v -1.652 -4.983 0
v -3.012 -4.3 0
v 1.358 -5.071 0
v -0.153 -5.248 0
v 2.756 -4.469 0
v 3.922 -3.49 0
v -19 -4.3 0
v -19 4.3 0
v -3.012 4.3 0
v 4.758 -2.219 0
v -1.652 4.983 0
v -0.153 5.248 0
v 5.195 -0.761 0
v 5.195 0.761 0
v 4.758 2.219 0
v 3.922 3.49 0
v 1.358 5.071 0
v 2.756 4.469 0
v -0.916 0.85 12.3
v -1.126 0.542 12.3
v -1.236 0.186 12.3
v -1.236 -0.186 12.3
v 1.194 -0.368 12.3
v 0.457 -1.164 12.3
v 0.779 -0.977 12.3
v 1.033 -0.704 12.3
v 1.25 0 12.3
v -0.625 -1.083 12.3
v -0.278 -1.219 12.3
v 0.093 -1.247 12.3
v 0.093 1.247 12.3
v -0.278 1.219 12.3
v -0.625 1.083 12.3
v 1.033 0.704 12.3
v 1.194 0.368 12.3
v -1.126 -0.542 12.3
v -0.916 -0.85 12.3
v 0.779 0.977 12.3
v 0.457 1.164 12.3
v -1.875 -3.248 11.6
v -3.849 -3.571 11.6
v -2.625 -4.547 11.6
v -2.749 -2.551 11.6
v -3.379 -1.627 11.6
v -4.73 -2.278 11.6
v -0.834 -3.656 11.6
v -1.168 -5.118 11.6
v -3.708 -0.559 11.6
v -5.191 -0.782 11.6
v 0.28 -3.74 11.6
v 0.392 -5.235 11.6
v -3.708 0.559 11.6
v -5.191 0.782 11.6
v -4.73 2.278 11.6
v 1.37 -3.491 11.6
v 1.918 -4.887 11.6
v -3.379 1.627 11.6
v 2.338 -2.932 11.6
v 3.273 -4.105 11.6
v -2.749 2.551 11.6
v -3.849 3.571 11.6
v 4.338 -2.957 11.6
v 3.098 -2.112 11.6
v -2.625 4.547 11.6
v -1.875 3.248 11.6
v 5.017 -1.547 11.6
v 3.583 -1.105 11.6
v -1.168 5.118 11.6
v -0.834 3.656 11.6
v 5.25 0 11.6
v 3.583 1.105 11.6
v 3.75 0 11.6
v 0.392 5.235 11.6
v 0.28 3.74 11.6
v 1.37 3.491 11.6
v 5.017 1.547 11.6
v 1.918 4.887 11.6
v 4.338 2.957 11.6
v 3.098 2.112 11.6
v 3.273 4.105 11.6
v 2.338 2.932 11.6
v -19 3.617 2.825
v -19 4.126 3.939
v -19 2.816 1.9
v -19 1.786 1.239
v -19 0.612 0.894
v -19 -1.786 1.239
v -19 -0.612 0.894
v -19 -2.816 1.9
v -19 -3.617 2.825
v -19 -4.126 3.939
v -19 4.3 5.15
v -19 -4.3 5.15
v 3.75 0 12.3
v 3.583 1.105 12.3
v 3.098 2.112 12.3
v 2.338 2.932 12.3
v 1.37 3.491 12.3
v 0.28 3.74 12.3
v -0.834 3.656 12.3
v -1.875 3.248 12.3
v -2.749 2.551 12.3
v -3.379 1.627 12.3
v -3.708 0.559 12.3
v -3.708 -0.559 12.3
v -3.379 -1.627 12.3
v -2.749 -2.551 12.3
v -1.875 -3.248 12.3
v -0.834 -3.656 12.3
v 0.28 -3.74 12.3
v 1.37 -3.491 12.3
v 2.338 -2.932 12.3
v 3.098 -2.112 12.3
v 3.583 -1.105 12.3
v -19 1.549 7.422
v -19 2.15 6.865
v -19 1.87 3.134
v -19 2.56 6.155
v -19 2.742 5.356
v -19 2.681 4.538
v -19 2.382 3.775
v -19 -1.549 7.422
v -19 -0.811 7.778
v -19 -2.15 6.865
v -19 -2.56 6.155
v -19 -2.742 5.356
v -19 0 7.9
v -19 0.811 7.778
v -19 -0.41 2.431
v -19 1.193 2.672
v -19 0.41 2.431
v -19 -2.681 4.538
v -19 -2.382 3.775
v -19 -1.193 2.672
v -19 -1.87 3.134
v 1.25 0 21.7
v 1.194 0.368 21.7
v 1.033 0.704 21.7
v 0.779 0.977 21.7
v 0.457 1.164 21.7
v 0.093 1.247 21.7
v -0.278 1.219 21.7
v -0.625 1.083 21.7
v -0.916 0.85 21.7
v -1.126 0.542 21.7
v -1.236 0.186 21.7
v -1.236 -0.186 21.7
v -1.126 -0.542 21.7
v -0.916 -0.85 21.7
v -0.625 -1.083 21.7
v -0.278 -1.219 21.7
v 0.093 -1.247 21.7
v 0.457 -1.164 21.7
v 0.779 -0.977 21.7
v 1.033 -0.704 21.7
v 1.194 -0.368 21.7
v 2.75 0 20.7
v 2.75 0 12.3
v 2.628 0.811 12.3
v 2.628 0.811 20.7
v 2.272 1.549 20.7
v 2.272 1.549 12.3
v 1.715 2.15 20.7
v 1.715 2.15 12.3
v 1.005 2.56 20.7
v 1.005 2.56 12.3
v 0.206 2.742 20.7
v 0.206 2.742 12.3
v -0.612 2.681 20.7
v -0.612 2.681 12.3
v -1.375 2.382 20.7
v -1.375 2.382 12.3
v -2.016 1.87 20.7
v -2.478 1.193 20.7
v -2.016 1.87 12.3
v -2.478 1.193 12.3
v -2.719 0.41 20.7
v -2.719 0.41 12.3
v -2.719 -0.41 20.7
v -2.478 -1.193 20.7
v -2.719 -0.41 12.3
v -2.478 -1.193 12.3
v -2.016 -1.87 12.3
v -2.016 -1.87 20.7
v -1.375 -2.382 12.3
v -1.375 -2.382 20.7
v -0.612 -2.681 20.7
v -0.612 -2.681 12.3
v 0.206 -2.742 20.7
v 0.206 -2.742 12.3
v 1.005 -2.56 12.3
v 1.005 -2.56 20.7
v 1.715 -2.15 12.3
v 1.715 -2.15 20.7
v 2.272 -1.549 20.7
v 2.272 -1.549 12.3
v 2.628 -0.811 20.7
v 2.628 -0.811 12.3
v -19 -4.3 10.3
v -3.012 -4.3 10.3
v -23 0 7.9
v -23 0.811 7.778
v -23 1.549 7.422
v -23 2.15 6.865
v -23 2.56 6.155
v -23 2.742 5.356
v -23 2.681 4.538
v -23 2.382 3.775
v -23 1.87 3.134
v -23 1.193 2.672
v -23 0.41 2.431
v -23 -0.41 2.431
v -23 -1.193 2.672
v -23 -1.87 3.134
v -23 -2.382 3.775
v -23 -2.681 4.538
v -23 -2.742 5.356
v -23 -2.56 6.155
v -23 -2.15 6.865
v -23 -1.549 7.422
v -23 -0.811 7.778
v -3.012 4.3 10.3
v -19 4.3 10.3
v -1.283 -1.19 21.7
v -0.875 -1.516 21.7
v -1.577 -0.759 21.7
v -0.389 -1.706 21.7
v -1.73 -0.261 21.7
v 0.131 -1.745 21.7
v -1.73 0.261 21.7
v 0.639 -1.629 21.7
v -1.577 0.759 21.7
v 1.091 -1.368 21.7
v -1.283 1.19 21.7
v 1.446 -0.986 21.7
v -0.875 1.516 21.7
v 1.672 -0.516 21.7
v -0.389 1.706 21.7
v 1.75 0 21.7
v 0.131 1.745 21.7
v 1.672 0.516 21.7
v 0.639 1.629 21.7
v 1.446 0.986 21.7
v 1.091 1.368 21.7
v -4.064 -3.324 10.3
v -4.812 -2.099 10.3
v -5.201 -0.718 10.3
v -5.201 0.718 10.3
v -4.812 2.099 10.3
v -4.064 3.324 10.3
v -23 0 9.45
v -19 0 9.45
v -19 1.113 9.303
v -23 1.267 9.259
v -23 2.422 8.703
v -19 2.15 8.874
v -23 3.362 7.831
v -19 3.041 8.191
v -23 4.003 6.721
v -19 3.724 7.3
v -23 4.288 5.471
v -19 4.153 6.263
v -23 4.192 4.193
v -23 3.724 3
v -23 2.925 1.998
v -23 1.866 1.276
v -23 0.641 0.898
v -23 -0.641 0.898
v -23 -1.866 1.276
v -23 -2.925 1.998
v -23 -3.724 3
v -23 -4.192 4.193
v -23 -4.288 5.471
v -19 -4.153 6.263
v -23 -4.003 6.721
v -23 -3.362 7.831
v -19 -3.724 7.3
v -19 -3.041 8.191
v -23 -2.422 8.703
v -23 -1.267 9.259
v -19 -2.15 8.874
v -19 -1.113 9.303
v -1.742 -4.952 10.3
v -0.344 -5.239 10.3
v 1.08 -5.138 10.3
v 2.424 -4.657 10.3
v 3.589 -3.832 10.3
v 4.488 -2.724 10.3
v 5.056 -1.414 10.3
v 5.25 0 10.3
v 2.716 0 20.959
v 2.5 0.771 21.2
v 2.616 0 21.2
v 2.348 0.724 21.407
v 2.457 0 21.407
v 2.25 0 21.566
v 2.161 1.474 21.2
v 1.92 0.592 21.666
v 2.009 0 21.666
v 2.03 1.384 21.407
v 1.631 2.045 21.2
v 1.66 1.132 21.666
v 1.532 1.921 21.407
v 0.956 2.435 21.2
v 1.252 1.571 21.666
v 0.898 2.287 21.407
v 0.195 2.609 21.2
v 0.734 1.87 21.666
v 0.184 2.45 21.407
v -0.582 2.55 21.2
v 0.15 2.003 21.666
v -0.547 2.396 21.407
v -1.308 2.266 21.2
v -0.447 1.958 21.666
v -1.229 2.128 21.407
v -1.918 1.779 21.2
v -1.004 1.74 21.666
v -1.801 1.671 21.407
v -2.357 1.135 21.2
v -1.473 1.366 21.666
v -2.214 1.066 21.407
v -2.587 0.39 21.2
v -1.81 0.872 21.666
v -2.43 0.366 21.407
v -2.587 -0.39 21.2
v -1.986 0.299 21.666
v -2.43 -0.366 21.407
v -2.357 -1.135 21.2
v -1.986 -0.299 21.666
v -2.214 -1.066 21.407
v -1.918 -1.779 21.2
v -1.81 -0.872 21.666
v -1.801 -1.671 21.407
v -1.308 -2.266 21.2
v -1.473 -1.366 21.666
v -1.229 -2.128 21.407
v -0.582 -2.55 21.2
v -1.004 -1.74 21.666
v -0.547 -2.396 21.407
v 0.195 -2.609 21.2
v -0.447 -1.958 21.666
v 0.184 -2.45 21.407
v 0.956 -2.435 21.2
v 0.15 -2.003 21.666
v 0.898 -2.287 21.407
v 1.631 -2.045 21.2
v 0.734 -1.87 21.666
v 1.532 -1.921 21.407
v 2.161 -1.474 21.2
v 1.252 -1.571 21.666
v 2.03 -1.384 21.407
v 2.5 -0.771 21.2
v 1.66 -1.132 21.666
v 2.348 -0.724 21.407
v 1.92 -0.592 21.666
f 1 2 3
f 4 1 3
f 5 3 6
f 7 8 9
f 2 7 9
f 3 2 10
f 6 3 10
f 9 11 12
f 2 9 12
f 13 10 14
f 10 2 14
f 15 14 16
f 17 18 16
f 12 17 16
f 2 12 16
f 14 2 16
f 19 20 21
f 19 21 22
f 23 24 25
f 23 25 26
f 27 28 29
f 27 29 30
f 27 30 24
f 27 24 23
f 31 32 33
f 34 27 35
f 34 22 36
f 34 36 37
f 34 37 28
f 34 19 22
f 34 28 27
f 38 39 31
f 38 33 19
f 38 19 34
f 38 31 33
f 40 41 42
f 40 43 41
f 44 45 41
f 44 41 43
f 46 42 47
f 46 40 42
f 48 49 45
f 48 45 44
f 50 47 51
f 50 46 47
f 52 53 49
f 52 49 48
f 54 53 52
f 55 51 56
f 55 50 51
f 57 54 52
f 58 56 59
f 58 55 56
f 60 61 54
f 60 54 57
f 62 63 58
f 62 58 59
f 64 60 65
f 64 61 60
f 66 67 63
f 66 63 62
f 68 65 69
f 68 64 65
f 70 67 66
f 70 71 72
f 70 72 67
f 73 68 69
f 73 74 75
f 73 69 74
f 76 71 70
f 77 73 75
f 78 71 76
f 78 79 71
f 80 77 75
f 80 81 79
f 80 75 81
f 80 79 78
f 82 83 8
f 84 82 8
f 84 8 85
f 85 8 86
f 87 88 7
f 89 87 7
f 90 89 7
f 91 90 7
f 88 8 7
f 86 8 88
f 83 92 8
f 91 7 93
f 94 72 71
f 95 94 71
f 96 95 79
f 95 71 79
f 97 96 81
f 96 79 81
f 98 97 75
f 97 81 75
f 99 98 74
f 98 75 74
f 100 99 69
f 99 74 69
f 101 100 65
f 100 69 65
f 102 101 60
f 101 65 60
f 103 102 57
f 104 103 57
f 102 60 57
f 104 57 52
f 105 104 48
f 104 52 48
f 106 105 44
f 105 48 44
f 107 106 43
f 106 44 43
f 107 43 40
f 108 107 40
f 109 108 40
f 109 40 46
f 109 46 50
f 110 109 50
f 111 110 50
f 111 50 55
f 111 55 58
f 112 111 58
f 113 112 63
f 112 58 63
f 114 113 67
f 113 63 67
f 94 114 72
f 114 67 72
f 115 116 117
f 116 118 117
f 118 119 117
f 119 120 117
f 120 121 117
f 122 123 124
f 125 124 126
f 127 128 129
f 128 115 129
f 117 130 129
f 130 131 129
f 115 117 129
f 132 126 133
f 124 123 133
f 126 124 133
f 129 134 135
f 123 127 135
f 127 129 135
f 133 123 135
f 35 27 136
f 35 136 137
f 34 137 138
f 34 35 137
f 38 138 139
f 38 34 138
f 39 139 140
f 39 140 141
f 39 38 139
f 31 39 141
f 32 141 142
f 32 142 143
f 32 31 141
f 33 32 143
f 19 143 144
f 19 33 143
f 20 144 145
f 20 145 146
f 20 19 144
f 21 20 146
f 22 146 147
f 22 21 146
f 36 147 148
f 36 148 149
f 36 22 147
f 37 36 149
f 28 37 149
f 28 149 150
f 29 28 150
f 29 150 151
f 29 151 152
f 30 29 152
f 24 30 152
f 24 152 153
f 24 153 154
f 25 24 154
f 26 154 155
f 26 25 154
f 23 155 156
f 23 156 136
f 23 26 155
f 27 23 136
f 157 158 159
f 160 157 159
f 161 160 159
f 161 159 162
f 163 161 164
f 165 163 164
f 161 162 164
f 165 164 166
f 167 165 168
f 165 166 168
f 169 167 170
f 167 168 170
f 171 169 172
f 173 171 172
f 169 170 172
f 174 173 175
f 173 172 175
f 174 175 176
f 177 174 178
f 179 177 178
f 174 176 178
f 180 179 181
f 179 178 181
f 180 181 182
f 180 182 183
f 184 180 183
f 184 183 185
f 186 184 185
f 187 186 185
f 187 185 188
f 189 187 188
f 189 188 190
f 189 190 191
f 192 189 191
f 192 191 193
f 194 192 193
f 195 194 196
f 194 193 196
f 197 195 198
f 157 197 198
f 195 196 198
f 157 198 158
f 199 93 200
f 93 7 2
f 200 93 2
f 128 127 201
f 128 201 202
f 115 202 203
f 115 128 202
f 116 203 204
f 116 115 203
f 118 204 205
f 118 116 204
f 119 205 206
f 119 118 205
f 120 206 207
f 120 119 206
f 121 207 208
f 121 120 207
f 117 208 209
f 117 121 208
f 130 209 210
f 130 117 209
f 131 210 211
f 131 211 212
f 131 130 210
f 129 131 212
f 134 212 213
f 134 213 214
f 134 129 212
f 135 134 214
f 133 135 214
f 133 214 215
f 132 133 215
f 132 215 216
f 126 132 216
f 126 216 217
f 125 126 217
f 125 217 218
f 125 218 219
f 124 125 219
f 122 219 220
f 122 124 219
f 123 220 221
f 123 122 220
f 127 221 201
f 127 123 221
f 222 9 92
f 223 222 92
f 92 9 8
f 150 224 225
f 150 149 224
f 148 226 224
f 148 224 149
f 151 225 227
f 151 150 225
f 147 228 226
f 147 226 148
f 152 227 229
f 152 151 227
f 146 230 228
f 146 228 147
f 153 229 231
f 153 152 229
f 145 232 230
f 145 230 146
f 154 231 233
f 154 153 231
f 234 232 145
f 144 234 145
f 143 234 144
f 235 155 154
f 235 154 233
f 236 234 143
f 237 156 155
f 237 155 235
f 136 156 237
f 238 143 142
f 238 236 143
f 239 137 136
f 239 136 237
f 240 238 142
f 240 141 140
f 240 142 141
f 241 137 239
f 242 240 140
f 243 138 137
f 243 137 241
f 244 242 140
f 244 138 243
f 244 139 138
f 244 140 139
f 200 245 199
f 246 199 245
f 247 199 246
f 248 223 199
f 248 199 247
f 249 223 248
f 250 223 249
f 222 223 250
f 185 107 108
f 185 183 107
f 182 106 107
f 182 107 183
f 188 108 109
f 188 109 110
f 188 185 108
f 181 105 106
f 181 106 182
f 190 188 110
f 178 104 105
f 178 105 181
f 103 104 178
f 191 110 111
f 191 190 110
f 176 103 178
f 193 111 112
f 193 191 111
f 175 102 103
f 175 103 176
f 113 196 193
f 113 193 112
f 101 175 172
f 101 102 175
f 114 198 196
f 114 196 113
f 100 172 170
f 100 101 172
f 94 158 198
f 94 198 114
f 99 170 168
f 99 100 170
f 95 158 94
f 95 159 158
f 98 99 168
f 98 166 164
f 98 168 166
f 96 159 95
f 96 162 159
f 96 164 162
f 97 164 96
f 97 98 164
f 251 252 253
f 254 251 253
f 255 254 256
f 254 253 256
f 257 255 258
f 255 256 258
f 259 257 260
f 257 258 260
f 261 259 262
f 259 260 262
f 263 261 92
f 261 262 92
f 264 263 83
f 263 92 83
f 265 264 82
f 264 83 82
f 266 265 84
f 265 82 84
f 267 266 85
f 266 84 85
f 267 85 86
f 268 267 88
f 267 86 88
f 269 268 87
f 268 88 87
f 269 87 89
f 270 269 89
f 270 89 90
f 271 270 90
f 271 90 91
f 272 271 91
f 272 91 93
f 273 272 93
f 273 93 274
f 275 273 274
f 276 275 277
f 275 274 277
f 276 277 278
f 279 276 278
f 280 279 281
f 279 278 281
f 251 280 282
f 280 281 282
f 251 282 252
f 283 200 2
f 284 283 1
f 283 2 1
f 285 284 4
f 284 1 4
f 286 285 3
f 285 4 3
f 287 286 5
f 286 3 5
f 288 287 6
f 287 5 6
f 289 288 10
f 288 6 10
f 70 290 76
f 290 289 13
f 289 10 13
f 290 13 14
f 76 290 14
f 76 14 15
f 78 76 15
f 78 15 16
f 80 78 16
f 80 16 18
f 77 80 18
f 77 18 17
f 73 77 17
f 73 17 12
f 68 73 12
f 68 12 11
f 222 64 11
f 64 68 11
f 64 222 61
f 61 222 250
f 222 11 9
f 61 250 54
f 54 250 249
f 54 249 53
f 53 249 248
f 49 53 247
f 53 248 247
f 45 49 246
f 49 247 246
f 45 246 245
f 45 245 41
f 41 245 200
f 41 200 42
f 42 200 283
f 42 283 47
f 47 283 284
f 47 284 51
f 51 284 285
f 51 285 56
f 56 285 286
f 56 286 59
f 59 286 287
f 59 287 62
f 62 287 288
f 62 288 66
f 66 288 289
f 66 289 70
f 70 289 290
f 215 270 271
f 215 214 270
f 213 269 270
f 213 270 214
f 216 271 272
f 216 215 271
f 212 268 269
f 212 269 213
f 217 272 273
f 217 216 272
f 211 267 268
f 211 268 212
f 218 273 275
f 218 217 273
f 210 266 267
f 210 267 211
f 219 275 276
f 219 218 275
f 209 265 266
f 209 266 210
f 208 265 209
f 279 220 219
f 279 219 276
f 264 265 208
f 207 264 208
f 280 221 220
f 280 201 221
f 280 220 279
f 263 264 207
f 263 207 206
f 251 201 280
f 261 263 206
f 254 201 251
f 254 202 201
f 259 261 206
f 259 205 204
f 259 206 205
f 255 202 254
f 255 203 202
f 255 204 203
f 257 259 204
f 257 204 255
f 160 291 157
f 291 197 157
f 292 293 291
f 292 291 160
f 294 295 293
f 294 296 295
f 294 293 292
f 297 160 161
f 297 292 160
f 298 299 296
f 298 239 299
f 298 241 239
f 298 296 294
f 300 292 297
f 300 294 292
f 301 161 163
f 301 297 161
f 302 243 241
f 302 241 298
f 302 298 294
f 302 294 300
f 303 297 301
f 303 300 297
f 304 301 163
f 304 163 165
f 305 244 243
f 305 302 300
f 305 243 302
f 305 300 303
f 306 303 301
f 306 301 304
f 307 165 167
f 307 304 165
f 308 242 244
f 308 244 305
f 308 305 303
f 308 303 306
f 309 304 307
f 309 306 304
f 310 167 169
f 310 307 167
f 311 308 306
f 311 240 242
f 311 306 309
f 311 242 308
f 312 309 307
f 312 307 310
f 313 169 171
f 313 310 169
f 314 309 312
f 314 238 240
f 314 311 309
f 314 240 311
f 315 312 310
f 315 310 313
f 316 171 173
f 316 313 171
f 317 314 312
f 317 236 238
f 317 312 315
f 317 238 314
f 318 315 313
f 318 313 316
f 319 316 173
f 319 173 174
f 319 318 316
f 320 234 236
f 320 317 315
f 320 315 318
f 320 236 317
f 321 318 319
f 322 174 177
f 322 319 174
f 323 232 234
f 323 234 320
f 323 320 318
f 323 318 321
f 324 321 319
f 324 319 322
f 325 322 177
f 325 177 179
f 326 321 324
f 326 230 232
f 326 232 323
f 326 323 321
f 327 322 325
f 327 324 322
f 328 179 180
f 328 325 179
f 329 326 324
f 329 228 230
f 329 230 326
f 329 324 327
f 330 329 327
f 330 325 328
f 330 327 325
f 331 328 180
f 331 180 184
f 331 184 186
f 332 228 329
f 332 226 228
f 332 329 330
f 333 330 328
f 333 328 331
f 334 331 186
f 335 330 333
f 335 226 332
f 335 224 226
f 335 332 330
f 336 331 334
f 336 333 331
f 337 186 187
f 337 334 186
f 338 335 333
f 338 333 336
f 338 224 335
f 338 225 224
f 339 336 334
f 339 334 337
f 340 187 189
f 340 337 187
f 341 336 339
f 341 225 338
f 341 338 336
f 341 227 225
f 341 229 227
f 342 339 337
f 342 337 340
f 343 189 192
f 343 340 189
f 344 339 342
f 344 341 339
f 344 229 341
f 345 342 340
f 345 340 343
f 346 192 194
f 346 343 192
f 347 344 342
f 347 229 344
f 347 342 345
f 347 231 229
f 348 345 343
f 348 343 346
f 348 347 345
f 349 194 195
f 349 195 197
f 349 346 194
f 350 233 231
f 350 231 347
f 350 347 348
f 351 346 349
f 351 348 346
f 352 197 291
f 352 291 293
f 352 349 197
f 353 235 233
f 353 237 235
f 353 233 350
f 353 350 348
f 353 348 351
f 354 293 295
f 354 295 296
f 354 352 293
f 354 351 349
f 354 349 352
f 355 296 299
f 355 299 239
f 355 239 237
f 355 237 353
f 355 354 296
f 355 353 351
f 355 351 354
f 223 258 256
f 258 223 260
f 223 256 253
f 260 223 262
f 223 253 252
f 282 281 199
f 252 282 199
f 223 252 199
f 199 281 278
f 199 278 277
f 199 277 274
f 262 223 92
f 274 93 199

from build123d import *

# Parameters (mm, degrees)
BOSS_EXTRUDE1_DEPTH = 10.3
SKETCH2_R           = 5.25
BOSS_EXTRUDE2_DEPTH = 1.3
SKETCH3_R           = 3.75
BOSS_EXTRUDE3_DEPTH = 0.7
SKETCH4_R           = 2.75
SKETCH4_R_2         = 1.25
BOSS_EXTRUDE4_DEPTH = 9.4
FILLET1_R           = 1
SKETCH5_R           = 4.3
SKETCH5_R_2         = 2.75
BOSS_EXTRUDE5_DEPTH = 4


with BuildPart() as part:
    # Sketch1 → Boss-Extrude1 (new body)
    with BuildSketch(Plane.XY):
        with BuildLine():
            Line((-3.012059096, 4.3), (-19, 4.3))
            Line((-19, 4.3), (-19, -4.3))
            Line((-19, -4.3), (-3.012059096, -4.3))
            ThreePointArc((-3.012059096, -4.3), (5.25, 0), (-3.012059096, 4.3))
        make_face()
    extrude(amount=BOSS_EXTRUDE1_DEPTH)

    # Sketch2 → Boss-Extrude2 (add)
    with BuildSketch(Plane.XY.offset(10.3)):
        Circle(SKETCH2_R)
    extrude(amount=BOSS_EXTRUDE2_DEPTH)

    # Sketch3 → Boss-Extrude3 (add)
    with BuildSketch(Plane.XY.offset(11.6)):
        Circle(SKETCH3_R)
    extrude(amount=BOSS_EXTRUDE3_DEPTH)

    # Sketch4 → Boss-Extrude4 (add)
    with BuildSketch(Plane.XY.offset(12.3)):
        Circle(SKETCH4_R)
        Circle(SKETCH4_R_2, mode=Mode.SUBTRACT)
    extrude(amount=BOSS_EXTRUDE4_DEPTH)

    # Fillet1
    fillet1_edges = [part.edges().sort_by_distance(p)[0] for p in [
        (-2.75, 0, 21.7),
    ]]
    fillet(fillet1_edges, radius=FILLET1_R)

    # Sketch5 → Boss-Extrude5 (add)
    with BuildSketch(Plane.ZY.offset(19)):
        with Locations((5.15, 0)):
            Circle(SKETCH5_R)
        with Locations((5.15, 0)):
            Circle(SKETCH5_R_2, mode=Mode.SUBTRACT)
    extrude(amount=BOSS_EXTRUDE5_DEPTH)


solid = part.part
